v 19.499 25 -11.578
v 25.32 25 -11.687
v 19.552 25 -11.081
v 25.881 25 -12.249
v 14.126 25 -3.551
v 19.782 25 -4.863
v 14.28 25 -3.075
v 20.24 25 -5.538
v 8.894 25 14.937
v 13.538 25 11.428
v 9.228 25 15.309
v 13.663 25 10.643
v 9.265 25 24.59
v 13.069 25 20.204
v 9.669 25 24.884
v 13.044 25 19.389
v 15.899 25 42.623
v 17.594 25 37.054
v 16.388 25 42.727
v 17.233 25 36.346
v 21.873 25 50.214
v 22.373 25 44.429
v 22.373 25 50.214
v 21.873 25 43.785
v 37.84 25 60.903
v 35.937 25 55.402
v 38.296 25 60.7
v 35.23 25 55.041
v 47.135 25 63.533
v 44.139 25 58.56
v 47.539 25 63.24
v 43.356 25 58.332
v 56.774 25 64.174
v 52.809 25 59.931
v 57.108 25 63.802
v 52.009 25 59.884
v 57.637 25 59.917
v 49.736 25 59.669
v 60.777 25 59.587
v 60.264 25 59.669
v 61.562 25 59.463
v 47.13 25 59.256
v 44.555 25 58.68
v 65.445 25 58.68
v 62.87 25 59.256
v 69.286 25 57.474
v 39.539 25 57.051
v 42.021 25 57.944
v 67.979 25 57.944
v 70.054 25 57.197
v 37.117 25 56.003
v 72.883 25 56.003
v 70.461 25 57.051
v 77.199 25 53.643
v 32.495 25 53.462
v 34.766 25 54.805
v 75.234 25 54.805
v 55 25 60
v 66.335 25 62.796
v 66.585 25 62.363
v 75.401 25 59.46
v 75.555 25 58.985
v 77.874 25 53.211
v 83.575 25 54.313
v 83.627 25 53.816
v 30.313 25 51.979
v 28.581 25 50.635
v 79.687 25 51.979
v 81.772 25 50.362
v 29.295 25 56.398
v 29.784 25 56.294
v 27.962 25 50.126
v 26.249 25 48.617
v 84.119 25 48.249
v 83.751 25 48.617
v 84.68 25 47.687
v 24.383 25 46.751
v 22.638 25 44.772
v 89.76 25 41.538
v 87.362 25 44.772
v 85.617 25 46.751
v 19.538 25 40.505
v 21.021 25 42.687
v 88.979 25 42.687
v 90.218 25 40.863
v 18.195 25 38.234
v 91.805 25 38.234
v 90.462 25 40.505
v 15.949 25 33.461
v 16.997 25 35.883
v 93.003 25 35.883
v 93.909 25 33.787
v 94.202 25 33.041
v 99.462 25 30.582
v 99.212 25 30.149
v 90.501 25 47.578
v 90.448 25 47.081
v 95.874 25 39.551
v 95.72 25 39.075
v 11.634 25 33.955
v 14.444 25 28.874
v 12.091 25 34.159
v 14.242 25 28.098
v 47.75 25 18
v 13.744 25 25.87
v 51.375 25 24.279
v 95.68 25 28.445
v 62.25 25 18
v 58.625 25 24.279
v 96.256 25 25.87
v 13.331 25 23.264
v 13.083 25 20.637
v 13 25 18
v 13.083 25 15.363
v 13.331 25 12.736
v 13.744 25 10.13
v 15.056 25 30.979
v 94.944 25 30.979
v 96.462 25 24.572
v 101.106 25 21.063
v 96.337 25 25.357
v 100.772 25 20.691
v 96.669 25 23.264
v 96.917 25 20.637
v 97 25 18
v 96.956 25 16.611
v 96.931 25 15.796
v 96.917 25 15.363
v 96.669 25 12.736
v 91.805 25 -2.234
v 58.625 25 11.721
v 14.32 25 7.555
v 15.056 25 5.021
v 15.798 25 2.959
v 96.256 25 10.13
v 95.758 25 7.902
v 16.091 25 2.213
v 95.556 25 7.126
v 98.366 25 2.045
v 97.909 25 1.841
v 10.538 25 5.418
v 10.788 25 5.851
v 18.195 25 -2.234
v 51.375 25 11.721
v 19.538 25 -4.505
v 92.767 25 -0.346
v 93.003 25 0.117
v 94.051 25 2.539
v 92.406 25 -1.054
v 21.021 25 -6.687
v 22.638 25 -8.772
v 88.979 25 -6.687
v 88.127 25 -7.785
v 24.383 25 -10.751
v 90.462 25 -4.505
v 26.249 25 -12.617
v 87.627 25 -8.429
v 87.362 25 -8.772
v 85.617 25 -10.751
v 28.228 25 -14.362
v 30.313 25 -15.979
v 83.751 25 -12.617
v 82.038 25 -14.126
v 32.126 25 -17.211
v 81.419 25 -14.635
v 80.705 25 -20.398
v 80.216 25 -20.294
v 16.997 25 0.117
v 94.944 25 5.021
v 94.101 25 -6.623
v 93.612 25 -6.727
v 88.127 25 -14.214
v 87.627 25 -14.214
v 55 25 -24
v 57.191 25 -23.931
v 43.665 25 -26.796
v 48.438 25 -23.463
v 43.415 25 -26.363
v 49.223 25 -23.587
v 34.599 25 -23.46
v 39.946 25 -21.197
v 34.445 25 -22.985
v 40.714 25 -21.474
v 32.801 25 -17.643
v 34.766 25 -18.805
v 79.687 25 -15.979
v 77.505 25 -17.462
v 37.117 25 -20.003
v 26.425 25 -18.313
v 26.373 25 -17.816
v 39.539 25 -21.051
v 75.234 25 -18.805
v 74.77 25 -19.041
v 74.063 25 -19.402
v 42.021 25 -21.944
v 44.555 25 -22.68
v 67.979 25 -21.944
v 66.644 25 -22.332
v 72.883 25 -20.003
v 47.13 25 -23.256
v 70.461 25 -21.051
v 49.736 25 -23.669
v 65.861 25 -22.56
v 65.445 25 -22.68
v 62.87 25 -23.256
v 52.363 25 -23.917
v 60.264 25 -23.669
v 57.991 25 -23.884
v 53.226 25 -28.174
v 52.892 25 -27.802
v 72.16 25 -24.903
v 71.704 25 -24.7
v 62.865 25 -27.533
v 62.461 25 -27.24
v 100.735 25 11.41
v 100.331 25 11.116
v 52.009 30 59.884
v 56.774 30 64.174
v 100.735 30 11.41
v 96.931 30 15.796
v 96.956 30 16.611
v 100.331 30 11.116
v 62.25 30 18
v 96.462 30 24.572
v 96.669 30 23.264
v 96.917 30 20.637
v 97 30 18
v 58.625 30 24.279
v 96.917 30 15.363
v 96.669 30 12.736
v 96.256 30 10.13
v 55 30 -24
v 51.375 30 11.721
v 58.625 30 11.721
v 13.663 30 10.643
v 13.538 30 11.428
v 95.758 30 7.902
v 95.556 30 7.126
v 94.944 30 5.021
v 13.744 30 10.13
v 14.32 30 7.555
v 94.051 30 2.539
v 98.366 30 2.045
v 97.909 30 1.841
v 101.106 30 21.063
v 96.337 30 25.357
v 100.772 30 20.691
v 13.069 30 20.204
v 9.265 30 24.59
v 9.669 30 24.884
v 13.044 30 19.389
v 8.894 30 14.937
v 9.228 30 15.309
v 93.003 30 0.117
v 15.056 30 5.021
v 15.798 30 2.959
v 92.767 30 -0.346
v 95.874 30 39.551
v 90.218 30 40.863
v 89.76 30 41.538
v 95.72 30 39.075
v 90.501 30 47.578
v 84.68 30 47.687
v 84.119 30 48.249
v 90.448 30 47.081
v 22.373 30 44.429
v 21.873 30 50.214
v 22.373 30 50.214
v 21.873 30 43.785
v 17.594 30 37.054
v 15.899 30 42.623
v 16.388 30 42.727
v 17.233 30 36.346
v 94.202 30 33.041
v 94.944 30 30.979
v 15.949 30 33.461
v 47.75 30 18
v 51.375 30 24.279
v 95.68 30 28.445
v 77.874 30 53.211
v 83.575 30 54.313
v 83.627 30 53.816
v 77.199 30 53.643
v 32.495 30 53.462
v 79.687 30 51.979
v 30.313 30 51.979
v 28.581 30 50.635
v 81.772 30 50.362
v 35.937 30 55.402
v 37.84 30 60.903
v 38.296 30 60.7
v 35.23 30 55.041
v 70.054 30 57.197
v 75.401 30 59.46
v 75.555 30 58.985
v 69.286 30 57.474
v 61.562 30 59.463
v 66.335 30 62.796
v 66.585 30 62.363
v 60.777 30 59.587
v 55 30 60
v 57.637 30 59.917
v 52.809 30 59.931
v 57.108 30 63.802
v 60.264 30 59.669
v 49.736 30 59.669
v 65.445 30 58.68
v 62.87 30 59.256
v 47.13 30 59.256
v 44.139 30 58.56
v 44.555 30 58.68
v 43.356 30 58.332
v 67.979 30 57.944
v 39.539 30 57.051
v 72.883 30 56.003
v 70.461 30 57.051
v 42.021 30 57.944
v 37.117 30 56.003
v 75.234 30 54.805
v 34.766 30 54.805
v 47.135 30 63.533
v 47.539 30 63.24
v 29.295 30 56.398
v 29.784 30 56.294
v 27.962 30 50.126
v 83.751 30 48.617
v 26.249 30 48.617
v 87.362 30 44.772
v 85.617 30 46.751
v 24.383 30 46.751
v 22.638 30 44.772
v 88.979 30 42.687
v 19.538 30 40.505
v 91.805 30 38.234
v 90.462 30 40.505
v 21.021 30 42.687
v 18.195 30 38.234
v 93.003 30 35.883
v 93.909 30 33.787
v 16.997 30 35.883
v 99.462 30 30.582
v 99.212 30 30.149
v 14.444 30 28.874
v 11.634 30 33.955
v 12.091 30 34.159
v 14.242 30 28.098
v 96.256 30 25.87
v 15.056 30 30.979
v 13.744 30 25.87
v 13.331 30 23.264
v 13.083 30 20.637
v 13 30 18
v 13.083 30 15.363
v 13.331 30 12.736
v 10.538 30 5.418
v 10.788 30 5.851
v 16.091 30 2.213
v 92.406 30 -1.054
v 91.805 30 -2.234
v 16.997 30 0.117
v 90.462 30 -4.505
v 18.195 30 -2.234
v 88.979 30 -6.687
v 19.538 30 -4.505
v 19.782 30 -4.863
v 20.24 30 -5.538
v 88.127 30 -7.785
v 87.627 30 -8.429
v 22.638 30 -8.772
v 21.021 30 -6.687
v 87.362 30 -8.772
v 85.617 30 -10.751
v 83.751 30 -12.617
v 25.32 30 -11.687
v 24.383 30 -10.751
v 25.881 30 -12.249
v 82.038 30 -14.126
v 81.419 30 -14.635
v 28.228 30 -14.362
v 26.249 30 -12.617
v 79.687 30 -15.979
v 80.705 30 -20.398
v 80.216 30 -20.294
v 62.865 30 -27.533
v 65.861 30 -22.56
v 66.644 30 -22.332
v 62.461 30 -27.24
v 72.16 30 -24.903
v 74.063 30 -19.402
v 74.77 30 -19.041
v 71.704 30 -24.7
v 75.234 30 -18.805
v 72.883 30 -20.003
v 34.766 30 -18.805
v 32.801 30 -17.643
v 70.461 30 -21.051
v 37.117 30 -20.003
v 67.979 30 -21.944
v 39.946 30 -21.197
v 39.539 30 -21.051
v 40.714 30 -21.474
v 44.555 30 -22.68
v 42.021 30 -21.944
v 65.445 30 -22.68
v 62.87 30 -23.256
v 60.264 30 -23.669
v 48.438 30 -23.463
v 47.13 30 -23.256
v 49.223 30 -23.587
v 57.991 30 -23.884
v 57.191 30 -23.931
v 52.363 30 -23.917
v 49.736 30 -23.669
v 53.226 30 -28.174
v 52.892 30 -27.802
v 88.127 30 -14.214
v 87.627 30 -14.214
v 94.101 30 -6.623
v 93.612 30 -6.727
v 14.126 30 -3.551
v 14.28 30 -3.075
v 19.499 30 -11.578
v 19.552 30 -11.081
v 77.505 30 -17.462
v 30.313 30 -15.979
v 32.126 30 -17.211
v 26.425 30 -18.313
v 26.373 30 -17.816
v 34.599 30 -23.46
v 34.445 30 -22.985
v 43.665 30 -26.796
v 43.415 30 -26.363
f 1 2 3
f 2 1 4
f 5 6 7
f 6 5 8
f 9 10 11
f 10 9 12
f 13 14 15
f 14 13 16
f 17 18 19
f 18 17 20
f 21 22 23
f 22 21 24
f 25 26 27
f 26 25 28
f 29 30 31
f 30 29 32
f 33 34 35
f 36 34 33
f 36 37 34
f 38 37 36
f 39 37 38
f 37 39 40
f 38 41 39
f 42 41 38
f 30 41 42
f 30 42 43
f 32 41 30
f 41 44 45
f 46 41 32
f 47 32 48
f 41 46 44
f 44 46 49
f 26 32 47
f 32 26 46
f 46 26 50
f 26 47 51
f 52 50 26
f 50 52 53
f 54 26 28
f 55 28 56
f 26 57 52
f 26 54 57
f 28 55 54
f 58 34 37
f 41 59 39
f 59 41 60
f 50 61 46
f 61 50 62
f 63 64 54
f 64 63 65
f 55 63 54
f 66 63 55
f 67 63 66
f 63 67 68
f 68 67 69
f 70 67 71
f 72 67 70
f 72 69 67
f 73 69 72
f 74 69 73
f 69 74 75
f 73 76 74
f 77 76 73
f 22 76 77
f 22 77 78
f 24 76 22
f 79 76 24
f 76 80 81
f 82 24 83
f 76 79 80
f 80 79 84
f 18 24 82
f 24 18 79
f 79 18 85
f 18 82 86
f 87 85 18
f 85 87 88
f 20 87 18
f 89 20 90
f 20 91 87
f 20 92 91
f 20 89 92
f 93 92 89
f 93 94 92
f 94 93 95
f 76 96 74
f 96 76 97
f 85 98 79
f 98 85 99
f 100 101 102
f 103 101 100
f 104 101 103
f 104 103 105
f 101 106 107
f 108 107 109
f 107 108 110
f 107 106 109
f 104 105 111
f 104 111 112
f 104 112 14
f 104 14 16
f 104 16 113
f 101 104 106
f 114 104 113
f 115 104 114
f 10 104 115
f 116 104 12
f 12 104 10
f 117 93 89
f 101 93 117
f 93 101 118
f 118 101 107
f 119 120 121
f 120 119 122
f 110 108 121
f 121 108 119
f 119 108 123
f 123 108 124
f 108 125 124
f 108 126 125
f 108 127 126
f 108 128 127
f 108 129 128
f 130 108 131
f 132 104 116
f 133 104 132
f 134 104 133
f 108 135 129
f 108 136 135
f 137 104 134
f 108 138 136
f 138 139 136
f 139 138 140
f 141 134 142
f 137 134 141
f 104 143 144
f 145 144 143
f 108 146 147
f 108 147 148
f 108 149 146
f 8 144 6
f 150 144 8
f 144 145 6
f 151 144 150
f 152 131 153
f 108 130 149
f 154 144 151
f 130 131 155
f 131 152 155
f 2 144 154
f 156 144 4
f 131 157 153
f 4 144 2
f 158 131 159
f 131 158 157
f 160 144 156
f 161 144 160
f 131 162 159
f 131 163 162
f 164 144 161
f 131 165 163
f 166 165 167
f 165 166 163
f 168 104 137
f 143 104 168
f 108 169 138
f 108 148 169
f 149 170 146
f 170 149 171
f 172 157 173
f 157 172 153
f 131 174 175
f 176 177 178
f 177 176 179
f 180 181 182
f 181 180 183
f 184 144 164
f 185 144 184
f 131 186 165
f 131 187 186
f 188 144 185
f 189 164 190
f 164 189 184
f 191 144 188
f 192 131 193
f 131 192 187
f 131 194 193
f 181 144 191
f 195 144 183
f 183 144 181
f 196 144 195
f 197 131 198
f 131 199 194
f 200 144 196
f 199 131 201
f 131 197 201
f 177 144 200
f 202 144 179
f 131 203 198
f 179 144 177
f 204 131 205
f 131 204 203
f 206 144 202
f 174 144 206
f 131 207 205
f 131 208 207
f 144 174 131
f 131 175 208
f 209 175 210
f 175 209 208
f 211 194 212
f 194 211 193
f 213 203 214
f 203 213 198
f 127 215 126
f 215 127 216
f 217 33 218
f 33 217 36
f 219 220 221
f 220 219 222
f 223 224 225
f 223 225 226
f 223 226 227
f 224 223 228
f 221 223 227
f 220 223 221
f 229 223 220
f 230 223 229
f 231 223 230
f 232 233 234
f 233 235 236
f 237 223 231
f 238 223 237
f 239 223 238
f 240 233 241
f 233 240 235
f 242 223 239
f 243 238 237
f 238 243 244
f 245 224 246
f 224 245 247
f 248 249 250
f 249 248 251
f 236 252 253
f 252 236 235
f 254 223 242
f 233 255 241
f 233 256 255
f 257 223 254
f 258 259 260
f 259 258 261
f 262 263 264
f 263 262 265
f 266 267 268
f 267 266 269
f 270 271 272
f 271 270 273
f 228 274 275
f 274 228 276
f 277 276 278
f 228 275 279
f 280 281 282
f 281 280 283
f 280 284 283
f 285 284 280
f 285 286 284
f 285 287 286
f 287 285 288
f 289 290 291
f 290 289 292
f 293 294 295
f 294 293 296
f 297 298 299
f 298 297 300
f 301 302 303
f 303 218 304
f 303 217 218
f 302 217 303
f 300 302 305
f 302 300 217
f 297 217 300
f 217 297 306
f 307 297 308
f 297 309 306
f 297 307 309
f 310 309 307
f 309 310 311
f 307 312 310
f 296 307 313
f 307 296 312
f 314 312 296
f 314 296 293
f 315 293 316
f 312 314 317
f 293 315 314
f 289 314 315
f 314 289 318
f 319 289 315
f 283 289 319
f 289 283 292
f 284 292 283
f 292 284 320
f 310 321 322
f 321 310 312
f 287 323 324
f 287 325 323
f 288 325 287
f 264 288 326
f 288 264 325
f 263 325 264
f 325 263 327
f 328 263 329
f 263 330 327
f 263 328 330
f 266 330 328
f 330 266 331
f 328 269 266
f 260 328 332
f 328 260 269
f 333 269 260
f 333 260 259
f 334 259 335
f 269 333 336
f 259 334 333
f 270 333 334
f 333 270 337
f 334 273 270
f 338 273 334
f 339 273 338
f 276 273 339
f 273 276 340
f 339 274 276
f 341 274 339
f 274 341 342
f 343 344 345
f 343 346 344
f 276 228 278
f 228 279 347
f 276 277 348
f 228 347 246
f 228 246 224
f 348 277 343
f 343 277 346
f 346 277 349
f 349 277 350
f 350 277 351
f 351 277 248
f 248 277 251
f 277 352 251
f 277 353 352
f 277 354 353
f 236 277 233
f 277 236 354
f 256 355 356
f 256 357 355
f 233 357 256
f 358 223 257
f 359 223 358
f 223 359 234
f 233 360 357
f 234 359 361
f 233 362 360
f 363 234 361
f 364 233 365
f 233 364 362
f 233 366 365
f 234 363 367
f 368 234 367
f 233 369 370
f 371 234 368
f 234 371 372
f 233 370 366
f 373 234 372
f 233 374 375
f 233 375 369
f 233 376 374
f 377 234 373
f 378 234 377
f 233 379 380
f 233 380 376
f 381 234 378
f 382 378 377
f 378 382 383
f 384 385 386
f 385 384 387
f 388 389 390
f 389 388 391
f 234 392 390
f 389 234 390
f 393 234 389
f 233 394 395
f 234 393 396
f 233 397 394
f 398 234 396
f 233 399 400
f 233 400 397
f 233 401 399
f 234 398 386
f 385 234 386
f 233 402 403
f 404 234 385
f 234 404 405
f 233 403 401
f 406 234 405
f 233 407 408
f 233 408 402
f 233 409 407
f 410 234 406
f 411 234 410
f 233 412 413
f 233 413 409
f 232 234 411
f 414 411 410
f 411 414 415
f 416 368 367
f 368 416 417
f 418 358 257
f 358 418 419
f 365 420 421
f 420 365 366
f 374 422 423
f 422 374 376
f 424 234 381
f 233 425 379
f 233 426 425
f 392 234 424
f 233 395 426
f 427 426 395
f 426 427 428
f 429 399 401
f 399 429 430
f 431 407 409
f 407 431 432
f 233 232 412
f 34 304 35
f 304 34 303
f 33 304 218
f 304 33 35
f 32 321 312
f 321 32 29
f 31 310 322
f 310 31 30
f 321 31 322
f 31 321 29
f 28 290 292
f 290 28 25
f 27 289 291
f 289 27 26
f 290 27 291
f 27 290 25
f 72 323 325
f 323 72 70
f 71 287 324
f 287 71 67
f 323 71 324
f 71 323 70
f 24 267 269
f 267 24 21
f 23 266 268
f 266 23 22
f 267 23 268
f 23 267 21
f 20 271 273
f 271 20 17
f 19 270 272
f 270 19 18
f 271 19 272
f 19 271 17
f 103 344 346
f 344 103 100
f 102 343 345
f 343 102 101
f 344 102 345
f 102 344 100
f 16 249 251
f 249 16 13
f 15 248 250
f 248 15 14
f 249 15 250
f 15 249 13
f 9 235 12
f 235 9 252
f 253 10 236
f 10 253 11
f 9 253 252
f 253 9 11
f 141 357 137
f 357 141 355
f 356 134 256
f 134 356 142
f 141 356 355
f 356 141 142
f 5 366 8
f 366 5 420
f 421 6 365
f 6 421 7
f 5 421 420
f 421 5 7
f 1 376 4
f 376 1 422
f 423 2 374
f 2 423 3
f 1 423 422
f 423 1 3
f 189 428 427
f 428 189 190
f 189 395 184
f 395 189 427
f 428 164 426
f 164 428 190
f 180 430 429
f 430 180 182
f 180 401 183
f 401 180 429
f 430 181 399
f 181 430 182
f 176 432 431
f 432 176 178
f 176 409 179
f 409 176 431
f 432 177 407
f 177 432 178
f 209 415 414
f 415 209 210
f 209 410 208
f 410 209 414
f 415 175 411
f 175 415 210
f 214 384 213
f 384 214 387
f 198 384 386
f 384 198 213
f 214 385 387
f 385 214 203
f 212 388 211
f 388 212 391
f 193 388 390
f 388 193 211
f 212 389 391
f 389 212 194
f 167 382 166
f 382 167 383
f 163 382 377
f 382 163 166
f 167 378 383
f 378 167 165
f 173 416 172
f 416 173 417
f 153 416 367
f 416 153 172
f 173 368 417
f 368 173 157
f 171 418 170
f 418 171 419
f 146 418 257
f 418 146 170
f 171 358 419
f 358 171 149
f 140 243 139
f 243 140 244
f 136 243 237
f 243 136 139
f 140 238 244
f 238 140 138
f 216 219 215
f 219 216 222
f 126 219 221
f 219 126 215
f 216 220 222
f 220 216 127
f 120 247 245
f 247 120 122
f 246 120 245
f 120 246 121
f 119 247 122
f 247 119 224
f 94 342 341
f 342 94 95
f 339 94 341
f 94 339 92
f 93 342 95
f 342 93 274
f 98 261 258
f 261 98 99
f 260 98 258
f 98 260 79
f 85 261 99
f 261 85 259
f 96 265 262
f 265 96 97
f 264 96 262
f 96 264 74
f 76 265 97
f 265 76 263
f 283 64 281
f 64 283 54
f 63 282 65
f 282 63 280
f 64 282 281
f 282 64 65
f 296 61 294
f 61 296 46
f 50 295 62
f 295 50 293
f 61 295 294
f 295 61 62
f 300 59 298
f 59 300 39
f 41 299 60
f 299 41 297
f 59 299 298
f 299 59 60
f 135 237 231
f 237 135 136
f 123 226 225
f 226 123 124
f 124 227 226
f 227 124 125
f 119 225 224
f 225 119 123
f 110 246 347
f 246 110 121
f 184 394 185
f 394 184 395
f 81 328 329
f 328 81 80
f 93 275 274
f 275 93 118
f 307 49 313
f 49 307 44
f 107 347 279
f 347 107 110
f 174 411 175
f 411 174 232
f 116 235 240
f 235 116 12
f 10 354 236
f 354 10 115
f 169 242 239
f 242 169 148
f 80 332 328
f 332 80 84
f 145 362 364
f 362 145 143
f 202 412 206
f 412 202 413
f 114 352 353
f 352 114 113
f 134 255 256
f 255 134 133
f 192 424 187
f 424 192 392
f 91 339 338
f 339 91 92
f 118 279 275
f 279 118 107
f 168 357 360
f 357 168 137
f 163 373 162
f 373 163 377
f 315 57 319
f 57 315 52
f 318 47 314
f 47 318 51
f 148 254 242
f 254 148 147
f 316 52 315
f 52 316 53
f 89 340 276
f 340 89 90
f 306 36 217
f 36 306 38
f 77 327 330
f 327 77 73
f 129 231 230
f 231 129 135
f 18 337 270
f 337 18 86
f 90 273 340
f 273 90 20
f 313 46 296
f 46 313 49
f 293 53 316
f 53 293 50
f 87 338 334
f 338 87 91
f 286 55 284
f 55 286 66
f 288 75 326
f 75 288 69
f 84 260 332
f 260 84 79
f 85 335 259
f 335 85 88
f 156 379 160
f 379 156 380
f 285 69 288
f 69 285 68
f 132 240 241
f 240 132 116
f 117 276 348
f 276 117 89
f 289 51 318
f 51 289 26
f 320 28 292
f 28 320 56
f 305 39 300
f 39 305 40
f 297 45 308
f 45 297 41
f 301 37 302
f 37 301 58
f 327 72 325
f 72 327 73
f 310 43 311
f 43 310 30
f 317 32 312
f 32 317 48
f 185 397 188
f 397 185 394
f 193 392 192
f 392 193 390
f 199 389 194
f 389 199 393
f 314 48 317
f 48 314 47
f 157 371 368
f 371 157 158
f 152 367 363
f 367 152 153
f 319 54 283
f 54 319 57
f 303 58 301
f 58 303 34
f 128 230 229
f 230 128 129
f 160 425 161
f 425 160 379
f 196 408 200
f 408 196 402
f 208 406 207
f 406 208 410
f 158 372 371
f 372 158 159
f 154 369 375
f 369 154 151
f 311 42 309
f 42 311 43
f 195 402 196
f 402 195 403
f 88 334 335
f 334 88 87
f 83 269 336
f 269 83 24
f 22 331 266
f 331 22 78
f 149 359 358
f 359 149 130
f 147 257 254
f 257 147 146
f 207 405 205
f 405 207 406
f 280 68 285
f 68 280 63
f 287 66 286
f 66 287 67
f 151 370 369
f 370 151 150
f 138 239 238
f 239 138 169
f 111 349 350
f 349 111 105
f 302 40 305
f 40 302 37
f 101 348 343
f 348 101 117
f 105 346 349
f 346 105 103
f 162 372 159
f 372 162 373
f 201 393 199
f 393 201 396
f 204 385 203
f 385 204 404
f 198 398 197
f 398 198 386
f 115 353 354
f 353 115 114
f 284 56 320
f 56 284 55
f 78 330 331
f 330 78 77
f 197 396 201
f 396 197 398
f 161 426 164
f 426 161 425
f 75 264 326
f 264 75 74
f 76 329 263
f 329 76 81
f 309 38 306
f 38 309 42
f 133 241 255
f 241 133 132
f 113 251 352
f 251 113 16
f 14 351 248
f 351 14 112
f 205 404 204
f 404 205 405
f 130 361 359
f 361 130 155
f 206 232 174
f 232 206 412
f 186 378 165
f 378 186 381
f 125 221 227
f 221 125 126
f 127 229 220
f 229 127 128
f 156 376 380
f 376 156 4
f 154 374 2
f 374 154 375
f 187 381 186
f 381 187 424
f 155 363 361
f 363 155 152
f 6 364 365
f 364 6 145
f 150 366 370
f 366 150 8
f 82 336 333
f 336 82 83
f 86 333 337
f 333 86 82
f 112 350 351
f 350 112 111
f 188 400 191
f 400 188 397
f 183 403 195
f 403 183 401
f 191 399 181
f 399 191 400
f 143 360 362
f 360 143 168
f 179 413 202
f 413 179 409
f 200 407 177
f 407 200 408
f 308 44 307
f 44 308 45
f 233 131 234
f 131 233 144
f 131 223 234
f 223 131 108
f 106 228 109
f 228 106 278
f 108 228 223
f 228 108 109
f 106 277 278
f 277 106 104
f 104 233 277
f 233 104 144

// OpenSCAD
translate([55,30,18]){
        rotate([90,0,0]){
            ratchet2complete();
        }
}
module ratchet2complete(){
    difference(){
        ratchet2();
        cylinder(7,7.25,7.25,$fn=6);
    }
}

module ratchet2(){

    
        cylinder(5,42,42,$fn=100);

        for ( i = [1:1:30]) {
            rotate([0, 0,i*360/30+5]){
                translate([0,36,0]){
                    rotate([0,0,25]){
                        cube([17, .5, 5]);
                    }
                }
            }
        }

}
